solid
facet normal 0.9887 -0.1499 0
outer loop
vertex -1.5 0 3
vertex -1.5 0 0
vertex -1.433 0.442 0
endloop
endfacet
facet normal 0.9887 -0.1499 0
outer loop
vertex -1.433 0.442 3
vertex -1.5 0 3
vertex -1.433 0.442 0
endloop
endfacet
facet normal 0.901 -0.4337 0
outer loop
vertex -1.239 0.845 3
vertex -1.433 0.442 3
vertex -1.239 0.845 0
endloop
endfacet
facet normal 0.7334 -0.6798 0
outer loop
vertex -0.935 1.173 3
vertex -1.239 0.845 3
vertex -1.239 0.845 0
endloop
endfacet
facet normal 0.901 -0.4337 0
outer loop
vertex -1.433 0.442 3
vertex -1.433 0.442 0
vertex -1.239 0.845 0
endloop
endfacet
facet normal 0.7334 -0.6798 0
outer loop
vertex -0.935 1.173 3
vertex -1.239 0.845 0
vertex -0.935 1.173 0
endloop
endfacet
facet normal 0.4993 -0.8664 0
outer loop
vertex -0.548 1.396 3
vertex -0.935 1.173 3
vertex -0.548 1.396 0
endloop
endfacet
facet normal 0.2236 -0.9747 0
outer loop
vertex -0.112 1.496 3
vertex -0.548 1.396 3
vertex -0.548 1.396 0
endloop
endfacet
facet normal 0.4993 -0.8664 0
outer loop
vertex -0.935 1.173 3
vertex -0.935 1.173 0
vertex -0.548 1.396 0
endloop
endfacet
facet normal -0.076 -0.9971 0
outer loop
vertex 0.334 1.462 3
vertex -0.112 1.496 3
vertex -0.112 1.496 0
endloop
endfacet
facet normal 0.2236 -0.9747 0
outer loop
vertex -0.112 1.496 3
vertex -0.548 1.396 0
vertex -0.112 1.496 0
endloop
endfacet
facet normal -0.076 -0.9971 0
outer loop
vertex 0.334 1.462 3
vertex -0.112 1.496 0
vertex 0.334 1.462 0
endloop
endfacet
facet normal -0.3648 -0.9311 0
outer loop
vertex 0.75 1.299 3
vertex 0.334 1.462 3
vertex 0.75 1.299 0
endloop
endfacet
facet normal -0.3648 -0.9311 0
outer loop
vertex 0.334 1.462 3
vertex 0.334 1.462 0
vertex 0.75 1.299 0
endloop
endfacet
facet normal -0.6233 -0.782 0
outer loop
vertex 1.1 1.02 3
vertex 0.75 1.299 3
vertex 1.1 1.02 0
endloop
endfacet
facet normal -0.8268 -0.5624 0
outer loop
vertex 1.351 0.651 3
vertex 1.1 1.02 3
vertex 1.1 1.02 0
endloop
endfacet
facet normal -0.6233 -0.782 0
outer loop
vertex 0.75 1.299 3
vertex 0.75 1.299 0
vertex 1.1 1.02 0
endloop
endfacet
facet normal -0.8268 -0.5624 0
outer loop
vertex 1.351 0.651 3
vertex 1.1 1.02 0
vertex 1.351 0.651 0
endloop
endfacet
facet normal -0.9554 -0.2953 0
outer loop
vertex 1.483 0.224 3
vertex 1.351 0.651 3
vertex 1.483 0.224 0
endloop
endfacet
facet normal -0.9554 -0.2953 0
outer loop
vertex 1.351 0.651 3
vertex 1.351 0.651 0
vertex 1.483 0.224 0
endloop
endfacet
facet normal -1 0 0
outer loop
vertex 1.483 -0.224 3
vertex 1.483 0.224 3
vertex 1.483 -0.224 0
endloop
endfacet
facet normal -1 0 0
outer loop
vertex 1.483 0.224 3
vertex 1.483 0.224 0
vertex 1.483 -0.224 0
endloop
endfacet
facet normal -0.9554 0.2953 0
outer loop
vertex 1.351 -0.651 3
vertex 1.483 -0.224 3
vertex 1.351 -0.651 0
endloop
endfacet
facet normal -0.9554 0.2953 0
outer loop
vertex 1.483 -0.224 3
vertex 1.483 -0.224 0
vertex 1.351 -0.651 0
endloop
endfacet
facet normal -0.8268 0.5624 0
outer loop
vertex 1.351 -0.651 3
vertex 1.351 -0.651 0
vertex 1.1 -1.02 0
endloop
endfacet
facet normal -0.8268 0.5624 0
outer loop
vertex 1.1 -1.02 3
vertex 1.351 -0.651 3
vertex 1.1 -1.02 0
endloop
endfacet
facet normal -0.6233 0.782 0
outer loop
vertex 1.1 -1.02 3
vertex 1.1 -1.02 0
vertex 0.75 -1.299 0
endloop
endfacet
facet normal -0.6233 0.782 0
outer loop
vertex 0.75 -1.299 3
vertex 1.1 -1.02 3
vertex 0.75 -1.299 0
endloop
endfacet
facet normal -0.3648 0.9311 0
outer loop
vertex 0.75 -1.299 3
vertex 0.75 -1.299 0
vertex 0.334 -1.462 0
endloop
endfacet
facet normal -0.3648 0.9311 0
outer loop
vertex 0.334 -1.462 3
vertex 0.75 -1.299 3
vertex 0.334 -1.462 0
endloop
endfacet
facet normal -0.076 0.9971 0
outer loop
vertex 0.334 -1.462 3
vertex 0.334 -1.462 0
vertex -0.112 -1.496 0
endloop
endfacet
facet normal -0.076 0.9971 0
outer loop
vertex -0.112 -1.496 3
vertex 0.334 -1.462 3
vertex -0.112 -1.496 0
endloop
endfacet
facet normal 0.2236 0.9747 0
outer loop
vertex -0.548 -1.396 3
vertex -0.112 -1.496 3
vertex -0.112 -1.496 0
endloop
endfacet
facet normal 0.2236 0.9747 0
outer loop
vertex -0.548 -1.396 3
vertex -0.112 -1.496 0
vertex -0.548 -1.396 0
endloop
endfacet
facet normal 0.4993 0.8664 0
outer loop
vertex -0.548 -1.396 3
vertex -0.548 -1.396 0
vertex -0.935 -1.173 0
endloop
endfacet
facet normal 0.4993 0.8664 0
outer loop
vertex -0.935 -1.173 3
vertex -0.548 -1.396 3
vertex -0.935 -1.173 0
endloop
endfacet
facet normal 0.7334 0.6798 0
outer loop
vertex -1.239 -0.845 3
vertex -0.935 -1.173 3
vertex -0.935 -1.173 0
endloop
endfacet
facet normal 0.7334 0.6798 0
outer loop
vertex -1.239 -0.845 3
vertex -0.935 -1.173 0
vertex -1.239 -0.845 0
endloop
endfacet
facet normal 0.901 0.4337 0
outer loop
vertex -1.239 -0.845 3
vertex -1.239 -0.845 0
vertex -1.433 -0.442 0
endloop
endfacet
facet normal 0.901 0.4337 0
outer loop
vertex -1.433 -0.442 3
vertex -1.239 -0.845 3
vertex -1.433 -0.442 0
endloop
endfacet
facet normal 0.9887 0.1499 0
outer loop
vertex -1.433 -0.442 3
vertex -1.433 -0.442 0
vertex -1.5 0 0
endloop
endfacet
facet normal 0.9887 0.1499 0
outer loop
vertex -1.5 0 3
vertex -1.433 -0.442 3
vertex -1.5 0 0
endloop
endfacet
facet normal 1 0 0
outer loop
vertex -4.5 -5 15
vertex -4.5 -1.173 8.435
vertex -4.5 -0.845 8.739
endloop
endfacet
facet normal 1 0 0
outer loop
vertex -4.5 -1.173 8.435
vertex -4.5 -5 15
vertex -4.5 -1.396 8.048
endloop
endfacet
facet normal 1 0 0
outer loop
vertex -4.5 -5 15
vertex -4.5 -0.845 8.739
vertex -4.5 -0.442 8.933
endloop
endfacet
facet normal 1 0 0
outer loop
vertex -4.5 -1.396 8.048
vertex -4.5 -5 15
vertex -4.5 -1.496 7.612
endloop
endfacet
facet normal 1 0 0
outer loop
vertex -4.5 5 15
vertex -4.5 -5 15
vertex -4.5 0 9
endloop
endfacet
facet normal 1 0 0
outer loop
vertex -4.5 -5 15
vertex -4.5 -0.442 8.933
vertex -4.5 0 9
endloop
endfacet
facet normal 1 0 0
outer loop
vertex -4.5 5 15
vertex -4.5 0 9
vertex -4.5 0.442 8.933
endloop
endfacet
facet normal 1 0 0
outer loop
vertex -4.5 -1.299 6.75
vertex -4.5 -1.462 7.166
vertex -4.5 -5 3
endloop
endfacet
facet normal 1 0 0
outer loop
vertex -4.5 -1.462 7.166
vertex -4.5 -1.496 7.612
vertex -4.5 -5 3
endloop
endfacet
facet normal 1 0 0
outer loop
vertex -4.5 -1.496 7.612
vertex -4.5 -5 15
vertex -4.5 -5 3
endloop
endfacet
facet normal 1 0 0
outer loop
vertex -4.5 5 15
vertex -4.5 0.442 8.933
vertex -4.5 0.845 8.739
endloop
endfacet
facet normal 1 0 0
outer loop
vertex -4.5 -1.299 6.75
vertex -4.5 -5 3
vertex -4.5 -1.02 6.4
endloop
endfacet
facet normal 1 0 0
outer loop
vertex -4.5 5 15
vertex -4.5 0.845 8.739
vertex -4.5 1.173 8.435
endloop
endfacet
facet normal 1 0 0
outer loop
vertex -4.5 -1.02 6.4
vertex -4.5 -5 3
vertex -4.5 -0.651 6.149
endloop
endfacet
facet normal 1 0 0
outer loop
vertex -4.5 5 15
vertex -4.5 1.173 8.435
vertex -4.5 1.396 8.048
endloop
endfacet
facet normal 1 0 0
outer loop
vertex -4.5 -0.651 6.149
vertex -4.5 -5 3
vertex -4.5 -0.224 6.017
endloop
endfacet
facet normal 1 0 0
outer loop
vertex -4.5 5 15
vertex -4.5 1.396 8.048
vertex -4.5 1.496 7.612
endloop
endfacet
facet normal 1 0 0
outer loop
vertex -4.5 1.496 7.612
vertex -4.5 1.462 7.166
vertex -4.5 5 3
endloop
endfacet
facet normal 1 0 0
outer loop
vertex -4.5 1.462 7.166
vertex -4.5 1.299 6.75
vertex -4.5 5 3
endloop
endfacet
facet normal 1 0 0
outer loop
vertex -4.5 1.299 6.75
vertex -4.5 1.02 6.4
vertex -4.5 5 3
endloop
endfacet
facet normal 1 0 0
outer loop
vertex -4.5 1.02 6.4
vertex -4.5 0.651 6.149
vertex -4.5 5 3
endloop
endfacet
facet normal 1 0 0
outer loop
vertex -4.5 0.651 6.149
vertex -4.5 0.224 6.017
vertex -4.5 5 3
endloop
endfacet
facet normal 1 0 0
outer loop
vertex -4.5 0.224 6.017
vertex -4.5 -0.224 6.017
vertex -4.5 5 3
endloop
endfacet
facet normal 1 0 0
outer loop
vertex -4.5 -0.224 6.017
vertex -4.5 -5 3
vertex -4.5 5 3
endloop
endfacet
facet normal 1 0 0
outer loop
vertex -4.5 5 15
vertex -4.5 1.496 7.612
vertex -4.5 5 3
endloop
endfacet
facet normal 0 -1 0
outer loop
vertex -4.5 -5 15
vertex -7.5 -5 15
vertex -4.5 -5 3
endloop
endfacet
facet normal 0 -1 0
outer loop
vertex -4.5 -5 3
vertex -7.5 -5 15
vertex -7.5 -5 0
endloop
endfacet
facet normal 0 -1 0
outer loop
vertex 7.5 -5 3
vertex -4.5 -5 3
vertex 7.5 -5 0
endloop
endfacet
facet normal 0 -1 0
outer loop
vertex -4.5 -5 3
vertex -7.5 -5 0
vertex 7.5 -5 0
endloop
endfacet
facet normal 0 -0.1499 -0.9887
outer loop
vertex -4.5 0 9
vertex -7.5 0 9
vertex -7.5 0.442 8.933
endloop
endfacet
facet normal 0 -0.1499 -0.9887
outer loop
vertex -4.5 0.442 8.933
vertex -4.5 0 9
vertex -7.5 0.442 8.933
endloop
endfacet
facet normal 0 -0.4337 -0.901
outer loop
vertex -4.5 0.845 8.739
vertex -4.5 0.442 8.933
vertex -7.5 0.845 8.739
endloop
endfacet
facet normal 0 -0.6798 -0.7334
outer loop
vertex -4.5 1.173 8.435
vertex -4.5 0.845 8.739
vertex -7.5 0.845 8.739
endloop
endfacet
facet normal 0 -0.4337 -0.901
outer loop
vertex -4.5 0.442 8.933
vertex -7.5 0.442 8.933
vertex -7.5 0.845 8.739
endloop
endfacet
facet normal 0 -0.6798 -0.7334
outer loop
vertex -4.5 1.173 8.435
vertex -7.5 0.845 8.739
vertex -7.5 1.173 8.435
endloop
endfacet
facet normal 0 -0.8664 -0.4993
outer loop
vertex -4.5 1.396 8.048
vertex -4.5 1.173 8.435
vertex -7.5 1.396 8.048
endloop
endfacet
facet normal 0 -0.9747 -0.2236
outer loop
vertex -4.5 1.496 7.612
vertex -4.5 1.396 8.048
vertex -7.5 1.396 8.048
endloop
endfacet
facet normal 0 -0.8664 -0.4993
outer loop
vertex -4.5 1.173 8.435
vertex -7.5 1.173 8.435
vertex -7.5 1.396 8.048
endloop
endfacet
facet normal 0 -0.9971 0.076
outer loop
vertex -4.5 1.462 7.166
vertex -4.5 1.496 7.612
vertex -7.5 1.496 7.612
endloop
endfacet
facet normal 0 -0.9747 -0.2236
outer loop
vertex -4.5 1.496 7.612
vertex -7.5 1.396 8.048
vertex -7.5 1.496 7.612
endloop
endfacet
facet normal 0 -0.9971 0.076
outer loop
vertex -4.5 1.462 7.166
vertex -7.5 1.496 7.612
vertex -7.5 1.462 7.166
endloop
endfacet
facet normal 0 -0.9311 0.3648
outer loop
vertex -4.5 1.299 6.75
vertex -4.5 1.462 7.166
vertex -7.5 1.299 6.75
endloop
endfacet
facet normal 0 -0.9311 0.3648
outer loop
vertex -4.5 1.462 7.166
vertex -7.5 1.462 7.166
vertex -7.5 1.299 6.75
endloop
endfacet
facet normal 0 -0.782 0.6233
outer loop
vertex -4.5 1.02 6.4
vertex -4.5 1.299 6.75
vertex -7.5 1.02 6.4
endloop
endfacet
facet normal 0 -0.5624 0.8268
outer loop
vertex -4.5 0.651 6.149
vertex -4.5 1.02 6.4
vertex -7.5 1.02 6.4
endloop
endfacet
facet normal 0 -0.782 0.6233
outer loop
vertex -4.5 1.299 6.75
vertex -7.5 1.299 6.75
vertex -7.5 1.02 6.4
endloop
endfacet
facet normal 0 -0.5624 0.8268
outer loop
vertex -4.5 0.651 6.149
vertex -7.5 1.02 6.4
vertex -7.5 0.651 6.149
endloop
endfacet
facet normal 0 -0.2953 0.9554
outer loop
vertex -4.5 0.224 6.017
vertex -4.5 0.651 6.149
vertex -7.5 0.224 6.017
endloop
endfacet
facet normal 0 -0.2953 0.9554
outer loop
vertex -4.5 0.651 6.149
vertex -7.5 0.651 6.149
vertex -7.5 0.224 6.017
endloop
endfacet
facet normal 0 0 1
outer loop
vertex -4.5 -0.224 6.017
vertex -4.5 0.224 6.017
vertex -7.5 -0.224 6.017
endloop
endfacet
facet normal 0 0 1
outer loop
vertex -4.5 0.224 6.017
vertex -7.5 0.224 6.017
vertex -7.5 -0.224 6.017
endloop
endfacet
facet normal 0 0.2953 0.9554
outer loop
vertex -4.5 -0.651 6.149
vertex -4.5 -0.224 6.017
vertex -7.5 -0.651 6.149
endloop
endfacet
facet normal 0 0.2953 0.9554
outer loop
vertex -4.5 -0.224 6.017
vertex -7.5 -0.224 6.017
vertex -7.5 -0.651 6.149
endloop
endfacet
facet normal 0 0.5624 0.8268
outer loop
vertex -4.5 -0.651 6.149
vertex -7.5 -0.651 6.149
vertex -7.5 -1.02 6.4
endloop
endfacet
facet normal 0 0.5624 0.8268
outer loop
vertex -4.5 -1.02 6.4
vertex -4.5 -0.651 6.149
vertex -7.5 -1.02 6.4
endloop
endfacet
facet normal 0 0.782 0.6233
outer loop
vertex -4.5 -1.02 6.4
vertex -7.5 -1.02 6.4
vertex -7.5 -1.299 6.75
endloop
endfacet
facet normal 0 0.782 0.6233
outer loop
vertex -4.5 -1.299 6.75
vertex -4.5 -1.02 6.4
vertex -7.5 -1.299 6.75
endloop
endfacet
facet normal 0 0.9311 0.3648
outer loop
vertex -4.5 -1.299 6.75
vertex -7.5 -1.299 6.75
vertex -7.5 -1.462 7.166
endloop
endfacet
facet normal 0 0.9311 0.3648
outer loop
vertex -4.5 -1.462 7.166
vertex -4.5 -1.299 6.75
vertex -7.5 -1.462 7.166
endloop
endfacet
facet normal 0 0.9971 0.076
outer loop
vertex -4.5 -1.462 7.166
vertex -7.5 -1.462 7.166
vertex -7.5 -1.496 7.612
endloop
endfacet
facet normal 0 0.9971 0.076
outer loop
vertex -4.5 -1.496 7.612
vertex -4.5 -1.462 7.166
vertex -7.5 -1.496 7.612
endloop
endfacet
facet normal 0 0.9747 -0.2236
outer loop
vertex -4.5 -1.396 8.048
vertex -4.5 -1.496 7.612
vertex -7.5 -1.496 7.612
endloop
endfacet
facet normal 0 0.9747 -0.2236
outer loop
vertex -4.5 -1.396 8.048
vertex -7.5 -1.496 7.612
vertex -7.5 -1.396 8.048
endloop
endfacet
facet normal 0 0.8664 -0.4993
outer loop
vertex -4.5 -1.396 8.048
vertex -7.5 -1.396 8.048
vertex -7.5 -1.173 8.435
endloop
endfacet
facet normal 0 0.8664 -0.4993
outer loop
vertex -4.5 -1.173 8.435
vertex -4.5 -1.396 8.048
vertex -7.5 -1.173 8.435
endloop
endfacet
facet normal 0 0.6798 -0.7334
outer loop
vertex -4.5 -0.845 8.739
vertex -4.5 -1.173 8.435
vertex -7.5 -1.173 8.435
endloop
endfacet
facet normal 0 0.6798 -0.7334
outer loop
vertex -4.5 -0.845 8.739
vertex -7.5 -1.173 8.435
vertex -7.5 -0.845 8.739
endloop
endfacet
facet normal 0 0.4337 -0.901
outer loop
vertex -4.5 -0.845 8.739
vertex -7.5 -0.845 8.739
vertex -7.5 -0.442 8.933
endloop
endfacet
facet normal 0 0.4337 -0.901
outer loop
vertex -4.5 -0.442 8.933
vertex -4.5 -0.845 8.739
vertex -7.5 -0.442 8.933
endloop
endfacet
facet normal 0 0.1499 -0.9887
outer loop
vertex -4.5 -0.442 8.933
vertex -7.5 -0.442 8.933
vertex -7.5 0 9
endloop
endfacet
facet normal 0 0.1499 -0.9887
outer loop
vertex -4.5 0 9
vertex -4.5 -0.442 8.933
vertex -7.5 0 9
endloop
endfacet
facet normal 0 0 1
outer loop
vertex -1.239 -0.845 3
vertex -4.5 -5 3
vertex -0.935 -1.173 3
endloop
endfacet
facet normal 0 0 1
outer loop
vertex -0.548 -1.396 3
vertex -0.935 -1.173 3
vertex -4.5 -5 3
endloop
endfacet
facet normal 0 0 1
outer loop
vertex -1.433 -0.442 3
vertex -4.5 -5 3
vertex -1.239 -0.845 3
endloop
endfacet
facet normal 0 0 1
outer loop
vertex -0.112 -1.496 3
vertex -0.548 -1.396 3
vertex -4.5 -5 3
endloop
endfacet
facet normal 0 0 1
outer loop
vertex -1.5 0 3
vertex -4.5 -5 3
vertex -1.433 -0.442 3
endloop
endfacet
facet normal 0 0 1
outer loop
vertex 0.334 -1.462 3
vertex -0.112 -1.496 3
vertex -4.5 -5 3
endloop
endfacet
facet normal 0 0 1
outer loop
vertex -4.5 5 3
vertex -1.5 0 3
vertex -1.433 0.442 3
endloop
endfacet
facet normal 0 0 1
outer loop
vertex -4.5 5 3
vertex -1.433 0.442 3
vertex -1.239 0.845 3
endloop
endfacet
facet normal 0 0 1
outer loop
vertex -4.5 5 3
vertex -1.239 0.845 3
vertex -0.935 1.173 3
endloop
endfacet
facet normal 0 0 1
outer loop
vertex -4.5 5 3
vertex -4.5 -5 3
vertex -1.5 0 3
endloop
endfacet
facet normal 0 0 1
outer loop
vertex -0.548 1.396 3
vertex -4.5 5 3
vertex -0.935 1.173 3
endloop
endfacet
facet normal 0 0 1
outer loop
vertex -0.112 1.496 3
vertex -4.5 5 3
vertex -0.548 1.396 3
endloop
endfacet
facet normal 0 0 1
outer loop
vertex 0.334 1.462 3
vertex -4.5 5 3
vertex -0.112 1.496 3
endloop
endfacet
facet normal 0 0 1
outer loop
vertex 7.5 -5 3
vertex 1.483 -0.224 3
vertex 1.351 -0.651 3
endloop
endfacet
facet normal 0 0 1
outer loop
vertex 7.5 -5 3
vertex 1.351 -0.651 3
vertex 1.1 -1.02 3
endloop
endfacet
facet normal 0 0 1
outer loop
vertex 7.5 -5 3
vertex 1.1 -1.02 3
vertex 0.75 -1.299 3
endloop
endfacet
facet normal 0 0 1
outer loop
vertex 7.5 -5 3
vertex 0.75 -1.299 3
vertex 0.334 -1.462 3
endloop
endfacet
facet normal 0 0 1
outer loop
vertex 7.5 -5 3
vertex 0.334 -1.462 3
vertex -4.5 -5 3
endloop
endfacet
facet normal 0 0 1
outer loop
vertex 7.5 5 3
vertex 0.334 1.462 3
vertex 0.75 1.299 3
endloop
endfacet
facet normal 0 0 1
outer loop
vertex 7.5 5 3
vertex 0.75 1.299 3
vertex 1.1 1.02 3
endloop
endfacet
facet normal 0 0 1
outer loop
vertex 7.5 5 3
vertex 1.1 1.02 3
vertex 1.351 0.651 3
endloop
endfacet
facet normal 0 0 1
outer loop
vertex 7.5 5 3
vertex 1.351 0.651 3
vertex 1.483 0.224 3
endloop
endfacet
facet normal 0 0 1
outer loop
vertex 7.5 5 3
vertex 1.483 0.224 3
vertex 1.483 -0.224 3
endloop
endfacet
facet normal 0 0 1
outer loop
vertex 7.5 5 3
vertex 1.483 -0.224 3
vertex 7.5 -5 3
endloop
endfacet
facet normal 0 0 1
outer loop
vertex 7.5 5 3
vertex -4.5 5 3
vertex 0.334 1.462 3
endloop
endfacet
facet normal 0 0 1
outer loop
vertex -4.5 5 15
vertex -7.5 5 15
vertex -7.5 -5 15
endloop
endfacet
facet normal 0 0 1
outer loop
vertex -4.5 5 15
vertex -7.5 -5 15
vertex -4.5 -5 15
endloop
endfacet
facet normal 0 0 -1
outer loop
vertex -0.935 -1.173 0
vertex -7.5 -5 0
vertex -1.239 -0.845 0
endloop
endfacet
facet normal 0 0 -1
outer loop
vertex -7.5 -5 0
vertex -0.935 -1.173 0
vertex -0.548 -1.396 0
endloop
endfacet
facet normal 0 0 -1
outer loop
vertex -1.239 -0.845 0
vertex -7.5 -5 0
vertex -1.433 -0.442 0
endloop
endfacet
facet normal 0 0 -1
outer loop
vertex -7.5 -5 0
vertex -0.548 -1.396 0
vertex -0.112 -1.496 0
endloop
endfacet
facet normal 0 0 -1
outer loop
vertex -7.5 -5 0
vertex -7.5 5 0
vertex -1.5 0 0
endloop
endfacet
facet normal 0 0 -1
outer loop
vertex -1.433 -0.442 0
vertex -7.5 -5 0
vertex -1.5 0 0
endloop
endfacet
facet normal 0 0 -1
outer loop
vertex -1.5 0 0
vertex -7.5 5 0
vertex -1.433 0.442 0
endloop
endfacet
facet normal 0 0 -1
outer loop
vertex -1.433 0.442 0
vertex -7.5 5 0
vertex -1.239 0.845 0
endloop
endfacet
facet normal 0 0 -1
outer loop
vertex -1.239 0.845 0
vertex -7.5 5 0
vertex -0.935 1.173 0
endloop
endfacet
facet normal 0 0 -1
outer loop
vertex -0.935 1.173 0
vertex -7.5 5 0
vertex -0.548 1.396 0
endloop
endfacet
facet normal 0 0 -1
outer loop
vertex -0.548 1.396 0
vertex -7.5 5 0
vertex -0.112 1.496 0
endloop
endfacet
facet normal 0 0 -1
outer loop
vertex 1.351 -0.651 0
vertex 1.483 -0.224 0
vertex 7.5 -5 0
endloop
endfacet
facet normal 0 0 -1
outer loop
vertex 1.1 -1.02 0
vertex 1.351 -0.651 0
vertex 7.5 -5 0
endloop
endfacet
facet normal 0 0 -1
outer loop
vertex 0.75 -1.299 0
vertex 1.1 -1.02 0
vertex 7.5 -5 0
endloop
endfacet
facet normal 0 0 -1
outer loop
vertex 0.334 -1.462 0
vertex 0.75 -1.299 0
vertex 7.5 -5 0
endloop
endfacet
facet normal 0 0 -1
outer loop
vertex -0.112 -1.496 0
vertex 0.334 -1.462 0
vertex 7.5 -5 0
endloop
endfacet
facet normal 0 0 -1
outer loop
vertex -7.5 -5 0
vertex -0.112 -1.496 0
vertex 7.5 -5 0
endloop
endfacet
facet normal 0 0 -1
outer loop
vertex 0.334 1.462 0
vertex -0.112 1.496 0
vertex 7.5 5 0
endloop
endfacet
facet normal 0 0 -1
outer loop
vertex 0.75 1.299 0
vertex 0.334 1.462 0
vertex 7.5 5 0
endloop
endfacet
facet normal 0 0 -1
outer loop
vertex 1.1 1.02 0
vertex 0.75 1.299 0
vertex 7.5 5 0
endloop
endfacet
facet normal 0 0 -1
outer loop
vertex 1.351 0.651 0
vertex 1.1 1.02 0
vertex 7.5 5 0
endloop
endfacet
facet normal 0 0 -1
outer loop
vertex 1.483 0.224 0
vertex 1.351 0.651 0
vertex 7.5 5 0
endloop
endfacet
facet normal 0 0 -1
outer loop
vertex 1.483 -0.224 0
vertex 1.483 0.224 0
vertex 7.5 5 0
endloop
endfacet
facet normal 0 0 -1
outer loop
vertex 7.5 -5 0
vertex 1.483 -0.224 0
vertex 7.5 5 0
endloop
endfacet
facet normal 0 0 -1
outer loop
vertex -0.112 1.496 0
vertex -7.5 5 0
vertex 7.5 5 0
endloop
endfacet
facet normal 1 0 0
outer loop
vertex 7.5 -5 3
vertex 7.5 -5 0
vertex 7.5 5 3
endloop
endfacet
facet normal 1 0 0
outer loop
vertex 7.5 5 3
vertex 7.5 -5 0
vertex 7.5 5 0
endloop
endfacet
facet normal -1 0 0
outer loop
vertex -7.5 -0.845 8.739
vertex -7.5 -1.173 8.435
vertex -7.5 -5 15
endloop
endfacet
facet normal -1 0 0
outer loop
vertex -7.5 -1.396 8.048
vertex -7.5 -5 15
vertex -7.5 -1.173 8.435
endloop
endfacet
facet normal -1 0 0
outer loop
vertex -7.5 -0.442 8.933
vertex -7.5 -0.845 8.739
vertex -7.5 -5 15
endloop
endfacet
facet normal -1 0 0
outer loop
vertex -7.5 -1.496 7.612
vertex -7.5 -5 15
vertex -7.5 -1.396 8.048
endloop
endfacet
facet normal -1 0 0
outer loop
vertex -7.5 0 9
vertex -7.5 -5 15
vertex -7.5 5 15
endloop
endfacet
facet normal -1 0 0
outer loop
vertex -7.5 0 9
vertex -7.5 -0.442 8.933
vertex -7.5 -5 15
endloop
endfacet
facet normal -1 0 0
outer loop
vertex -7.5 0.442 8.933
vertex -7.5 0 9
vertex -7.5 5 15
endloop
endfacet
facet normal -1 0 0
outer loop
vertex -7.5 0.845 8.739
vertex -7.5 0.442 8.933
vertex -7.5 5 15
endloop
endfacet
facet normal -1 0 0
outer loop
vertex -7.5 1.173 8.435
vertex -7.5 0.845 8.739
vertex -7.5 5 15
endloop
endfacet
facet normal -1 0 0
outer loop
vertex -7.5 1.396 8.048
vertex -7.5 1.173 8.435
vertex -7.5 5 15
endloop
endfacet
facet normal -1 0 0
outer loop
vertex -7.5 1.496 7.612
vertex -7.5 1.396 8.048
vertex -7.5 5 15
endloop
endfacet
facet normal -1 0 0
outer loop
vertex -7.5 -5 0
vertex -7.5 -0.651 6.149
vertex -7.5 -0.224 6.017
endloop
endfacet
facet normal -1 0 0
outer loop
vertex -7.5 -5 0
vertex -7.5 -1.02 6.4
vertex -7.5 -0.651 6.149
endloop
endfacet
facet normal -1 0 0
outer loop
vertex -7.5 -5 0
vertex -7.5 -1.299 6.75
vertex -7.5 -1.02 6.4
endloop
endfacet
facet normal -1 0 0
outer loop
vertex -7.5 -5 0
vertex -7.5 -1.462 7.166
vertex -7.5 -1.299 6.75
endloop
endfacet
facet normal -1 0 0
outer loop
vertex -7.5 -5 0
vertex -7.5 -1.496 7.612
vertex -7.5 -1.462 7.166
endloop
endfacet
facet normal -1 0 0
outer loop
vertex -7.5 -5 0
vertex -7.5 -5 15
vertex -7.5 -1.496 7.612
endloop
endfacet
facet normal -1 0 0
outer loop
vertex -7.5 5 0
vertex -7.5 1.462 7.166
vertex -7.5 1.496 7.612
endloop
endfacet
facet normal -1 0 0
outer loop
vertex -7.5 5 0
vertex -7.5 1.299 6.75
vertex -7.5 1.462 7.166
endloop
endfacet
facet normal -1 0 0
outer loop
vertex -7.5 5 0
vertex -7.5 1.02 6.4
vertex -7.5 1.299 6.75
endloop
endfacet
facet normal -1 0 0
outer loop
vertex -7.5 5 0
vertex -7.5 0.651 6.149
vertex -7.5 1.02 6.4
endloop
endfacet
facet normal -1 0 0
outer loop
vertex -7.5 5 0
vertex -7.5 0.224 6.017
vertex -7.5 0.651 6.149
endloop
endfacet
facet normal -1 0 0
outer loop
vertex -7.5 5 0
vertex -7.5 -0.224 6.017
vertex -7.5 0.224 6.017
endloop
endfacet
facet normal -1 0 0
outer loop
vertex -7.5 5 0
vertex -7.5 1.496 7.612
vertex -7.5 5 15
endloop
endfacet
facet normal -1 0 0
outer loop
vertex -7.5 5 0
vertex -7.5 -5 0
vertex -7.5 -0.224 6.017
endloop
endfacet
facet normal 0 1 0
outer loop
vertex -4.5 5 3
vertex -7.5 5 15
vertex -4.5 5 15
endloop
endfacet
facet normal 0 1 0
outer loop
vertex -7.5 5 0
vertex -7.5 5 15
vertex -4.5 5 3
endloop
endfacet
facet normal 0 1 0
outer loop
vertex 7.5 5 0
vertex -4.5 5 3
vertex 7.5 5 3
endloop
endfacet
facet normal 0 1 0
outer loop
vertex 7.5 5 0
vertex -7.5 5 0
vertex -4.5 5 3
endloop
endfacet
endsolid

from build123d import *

# Parameters (mm, degrees)
SKETCH_1_W          = 15
SKETCH_1_H          = 10
EXTRUDE_1_DEPTH     = 3
SKETCH_2_W          = 3
SKETCH_2_H          = 10
EXTRUDE_2_DEPTH     = 12
SKETCH_3_R          = 1.5
CUT_EXTRUDE_1_DEPTH = 7
SKETCH_4_R          = 1.5
CUT_EXTRUDE_2_DEPTH = 7


with BuildPart() as part:
    # 草图1 → 凸台-拉伸1 (new body)
    with BuildSketch(Plane.XY):
        Rectangle(SKETCH_1_W, SKETCH_1_H)
    extrude(amount=EXTRUDE_1_DEPTH)

    # 草图2 → 凸台-拉伸2 (add)
    with BuildSketch(Plane.XY.offset(3)):
        with Locations((-6, 0)):
            Rectangle(SKETCH_2_W, SKETCH_2_H)
    extrude(amount=EXTRUDE_2_DEPTH)

    # 草图3 → 切除-拉伸1 (cut)
    with BuildSketch(Plane(origin=(0, 0, 0), x_dir=(-1, 0, 0), z_dir=(0, 0, -1))):
        Circle(SKETCH_3_R)
    extrude(amount=-CUT_EXTRUDE_1_DEPTH, mode=Mode.SUBTRACT)

    # 草图4 → 切除-拉伸2 (cut)
    with BuildSketch(Plane.ZY.offset(7.5)):
        with Locations((7.5, 0)):
            Circle(SKETCH_4_R)
    extrude(amount=-CUT_EXTRUDE_2_DEPTH, mode=Mode.SUBTRACT)


solid = part.part
